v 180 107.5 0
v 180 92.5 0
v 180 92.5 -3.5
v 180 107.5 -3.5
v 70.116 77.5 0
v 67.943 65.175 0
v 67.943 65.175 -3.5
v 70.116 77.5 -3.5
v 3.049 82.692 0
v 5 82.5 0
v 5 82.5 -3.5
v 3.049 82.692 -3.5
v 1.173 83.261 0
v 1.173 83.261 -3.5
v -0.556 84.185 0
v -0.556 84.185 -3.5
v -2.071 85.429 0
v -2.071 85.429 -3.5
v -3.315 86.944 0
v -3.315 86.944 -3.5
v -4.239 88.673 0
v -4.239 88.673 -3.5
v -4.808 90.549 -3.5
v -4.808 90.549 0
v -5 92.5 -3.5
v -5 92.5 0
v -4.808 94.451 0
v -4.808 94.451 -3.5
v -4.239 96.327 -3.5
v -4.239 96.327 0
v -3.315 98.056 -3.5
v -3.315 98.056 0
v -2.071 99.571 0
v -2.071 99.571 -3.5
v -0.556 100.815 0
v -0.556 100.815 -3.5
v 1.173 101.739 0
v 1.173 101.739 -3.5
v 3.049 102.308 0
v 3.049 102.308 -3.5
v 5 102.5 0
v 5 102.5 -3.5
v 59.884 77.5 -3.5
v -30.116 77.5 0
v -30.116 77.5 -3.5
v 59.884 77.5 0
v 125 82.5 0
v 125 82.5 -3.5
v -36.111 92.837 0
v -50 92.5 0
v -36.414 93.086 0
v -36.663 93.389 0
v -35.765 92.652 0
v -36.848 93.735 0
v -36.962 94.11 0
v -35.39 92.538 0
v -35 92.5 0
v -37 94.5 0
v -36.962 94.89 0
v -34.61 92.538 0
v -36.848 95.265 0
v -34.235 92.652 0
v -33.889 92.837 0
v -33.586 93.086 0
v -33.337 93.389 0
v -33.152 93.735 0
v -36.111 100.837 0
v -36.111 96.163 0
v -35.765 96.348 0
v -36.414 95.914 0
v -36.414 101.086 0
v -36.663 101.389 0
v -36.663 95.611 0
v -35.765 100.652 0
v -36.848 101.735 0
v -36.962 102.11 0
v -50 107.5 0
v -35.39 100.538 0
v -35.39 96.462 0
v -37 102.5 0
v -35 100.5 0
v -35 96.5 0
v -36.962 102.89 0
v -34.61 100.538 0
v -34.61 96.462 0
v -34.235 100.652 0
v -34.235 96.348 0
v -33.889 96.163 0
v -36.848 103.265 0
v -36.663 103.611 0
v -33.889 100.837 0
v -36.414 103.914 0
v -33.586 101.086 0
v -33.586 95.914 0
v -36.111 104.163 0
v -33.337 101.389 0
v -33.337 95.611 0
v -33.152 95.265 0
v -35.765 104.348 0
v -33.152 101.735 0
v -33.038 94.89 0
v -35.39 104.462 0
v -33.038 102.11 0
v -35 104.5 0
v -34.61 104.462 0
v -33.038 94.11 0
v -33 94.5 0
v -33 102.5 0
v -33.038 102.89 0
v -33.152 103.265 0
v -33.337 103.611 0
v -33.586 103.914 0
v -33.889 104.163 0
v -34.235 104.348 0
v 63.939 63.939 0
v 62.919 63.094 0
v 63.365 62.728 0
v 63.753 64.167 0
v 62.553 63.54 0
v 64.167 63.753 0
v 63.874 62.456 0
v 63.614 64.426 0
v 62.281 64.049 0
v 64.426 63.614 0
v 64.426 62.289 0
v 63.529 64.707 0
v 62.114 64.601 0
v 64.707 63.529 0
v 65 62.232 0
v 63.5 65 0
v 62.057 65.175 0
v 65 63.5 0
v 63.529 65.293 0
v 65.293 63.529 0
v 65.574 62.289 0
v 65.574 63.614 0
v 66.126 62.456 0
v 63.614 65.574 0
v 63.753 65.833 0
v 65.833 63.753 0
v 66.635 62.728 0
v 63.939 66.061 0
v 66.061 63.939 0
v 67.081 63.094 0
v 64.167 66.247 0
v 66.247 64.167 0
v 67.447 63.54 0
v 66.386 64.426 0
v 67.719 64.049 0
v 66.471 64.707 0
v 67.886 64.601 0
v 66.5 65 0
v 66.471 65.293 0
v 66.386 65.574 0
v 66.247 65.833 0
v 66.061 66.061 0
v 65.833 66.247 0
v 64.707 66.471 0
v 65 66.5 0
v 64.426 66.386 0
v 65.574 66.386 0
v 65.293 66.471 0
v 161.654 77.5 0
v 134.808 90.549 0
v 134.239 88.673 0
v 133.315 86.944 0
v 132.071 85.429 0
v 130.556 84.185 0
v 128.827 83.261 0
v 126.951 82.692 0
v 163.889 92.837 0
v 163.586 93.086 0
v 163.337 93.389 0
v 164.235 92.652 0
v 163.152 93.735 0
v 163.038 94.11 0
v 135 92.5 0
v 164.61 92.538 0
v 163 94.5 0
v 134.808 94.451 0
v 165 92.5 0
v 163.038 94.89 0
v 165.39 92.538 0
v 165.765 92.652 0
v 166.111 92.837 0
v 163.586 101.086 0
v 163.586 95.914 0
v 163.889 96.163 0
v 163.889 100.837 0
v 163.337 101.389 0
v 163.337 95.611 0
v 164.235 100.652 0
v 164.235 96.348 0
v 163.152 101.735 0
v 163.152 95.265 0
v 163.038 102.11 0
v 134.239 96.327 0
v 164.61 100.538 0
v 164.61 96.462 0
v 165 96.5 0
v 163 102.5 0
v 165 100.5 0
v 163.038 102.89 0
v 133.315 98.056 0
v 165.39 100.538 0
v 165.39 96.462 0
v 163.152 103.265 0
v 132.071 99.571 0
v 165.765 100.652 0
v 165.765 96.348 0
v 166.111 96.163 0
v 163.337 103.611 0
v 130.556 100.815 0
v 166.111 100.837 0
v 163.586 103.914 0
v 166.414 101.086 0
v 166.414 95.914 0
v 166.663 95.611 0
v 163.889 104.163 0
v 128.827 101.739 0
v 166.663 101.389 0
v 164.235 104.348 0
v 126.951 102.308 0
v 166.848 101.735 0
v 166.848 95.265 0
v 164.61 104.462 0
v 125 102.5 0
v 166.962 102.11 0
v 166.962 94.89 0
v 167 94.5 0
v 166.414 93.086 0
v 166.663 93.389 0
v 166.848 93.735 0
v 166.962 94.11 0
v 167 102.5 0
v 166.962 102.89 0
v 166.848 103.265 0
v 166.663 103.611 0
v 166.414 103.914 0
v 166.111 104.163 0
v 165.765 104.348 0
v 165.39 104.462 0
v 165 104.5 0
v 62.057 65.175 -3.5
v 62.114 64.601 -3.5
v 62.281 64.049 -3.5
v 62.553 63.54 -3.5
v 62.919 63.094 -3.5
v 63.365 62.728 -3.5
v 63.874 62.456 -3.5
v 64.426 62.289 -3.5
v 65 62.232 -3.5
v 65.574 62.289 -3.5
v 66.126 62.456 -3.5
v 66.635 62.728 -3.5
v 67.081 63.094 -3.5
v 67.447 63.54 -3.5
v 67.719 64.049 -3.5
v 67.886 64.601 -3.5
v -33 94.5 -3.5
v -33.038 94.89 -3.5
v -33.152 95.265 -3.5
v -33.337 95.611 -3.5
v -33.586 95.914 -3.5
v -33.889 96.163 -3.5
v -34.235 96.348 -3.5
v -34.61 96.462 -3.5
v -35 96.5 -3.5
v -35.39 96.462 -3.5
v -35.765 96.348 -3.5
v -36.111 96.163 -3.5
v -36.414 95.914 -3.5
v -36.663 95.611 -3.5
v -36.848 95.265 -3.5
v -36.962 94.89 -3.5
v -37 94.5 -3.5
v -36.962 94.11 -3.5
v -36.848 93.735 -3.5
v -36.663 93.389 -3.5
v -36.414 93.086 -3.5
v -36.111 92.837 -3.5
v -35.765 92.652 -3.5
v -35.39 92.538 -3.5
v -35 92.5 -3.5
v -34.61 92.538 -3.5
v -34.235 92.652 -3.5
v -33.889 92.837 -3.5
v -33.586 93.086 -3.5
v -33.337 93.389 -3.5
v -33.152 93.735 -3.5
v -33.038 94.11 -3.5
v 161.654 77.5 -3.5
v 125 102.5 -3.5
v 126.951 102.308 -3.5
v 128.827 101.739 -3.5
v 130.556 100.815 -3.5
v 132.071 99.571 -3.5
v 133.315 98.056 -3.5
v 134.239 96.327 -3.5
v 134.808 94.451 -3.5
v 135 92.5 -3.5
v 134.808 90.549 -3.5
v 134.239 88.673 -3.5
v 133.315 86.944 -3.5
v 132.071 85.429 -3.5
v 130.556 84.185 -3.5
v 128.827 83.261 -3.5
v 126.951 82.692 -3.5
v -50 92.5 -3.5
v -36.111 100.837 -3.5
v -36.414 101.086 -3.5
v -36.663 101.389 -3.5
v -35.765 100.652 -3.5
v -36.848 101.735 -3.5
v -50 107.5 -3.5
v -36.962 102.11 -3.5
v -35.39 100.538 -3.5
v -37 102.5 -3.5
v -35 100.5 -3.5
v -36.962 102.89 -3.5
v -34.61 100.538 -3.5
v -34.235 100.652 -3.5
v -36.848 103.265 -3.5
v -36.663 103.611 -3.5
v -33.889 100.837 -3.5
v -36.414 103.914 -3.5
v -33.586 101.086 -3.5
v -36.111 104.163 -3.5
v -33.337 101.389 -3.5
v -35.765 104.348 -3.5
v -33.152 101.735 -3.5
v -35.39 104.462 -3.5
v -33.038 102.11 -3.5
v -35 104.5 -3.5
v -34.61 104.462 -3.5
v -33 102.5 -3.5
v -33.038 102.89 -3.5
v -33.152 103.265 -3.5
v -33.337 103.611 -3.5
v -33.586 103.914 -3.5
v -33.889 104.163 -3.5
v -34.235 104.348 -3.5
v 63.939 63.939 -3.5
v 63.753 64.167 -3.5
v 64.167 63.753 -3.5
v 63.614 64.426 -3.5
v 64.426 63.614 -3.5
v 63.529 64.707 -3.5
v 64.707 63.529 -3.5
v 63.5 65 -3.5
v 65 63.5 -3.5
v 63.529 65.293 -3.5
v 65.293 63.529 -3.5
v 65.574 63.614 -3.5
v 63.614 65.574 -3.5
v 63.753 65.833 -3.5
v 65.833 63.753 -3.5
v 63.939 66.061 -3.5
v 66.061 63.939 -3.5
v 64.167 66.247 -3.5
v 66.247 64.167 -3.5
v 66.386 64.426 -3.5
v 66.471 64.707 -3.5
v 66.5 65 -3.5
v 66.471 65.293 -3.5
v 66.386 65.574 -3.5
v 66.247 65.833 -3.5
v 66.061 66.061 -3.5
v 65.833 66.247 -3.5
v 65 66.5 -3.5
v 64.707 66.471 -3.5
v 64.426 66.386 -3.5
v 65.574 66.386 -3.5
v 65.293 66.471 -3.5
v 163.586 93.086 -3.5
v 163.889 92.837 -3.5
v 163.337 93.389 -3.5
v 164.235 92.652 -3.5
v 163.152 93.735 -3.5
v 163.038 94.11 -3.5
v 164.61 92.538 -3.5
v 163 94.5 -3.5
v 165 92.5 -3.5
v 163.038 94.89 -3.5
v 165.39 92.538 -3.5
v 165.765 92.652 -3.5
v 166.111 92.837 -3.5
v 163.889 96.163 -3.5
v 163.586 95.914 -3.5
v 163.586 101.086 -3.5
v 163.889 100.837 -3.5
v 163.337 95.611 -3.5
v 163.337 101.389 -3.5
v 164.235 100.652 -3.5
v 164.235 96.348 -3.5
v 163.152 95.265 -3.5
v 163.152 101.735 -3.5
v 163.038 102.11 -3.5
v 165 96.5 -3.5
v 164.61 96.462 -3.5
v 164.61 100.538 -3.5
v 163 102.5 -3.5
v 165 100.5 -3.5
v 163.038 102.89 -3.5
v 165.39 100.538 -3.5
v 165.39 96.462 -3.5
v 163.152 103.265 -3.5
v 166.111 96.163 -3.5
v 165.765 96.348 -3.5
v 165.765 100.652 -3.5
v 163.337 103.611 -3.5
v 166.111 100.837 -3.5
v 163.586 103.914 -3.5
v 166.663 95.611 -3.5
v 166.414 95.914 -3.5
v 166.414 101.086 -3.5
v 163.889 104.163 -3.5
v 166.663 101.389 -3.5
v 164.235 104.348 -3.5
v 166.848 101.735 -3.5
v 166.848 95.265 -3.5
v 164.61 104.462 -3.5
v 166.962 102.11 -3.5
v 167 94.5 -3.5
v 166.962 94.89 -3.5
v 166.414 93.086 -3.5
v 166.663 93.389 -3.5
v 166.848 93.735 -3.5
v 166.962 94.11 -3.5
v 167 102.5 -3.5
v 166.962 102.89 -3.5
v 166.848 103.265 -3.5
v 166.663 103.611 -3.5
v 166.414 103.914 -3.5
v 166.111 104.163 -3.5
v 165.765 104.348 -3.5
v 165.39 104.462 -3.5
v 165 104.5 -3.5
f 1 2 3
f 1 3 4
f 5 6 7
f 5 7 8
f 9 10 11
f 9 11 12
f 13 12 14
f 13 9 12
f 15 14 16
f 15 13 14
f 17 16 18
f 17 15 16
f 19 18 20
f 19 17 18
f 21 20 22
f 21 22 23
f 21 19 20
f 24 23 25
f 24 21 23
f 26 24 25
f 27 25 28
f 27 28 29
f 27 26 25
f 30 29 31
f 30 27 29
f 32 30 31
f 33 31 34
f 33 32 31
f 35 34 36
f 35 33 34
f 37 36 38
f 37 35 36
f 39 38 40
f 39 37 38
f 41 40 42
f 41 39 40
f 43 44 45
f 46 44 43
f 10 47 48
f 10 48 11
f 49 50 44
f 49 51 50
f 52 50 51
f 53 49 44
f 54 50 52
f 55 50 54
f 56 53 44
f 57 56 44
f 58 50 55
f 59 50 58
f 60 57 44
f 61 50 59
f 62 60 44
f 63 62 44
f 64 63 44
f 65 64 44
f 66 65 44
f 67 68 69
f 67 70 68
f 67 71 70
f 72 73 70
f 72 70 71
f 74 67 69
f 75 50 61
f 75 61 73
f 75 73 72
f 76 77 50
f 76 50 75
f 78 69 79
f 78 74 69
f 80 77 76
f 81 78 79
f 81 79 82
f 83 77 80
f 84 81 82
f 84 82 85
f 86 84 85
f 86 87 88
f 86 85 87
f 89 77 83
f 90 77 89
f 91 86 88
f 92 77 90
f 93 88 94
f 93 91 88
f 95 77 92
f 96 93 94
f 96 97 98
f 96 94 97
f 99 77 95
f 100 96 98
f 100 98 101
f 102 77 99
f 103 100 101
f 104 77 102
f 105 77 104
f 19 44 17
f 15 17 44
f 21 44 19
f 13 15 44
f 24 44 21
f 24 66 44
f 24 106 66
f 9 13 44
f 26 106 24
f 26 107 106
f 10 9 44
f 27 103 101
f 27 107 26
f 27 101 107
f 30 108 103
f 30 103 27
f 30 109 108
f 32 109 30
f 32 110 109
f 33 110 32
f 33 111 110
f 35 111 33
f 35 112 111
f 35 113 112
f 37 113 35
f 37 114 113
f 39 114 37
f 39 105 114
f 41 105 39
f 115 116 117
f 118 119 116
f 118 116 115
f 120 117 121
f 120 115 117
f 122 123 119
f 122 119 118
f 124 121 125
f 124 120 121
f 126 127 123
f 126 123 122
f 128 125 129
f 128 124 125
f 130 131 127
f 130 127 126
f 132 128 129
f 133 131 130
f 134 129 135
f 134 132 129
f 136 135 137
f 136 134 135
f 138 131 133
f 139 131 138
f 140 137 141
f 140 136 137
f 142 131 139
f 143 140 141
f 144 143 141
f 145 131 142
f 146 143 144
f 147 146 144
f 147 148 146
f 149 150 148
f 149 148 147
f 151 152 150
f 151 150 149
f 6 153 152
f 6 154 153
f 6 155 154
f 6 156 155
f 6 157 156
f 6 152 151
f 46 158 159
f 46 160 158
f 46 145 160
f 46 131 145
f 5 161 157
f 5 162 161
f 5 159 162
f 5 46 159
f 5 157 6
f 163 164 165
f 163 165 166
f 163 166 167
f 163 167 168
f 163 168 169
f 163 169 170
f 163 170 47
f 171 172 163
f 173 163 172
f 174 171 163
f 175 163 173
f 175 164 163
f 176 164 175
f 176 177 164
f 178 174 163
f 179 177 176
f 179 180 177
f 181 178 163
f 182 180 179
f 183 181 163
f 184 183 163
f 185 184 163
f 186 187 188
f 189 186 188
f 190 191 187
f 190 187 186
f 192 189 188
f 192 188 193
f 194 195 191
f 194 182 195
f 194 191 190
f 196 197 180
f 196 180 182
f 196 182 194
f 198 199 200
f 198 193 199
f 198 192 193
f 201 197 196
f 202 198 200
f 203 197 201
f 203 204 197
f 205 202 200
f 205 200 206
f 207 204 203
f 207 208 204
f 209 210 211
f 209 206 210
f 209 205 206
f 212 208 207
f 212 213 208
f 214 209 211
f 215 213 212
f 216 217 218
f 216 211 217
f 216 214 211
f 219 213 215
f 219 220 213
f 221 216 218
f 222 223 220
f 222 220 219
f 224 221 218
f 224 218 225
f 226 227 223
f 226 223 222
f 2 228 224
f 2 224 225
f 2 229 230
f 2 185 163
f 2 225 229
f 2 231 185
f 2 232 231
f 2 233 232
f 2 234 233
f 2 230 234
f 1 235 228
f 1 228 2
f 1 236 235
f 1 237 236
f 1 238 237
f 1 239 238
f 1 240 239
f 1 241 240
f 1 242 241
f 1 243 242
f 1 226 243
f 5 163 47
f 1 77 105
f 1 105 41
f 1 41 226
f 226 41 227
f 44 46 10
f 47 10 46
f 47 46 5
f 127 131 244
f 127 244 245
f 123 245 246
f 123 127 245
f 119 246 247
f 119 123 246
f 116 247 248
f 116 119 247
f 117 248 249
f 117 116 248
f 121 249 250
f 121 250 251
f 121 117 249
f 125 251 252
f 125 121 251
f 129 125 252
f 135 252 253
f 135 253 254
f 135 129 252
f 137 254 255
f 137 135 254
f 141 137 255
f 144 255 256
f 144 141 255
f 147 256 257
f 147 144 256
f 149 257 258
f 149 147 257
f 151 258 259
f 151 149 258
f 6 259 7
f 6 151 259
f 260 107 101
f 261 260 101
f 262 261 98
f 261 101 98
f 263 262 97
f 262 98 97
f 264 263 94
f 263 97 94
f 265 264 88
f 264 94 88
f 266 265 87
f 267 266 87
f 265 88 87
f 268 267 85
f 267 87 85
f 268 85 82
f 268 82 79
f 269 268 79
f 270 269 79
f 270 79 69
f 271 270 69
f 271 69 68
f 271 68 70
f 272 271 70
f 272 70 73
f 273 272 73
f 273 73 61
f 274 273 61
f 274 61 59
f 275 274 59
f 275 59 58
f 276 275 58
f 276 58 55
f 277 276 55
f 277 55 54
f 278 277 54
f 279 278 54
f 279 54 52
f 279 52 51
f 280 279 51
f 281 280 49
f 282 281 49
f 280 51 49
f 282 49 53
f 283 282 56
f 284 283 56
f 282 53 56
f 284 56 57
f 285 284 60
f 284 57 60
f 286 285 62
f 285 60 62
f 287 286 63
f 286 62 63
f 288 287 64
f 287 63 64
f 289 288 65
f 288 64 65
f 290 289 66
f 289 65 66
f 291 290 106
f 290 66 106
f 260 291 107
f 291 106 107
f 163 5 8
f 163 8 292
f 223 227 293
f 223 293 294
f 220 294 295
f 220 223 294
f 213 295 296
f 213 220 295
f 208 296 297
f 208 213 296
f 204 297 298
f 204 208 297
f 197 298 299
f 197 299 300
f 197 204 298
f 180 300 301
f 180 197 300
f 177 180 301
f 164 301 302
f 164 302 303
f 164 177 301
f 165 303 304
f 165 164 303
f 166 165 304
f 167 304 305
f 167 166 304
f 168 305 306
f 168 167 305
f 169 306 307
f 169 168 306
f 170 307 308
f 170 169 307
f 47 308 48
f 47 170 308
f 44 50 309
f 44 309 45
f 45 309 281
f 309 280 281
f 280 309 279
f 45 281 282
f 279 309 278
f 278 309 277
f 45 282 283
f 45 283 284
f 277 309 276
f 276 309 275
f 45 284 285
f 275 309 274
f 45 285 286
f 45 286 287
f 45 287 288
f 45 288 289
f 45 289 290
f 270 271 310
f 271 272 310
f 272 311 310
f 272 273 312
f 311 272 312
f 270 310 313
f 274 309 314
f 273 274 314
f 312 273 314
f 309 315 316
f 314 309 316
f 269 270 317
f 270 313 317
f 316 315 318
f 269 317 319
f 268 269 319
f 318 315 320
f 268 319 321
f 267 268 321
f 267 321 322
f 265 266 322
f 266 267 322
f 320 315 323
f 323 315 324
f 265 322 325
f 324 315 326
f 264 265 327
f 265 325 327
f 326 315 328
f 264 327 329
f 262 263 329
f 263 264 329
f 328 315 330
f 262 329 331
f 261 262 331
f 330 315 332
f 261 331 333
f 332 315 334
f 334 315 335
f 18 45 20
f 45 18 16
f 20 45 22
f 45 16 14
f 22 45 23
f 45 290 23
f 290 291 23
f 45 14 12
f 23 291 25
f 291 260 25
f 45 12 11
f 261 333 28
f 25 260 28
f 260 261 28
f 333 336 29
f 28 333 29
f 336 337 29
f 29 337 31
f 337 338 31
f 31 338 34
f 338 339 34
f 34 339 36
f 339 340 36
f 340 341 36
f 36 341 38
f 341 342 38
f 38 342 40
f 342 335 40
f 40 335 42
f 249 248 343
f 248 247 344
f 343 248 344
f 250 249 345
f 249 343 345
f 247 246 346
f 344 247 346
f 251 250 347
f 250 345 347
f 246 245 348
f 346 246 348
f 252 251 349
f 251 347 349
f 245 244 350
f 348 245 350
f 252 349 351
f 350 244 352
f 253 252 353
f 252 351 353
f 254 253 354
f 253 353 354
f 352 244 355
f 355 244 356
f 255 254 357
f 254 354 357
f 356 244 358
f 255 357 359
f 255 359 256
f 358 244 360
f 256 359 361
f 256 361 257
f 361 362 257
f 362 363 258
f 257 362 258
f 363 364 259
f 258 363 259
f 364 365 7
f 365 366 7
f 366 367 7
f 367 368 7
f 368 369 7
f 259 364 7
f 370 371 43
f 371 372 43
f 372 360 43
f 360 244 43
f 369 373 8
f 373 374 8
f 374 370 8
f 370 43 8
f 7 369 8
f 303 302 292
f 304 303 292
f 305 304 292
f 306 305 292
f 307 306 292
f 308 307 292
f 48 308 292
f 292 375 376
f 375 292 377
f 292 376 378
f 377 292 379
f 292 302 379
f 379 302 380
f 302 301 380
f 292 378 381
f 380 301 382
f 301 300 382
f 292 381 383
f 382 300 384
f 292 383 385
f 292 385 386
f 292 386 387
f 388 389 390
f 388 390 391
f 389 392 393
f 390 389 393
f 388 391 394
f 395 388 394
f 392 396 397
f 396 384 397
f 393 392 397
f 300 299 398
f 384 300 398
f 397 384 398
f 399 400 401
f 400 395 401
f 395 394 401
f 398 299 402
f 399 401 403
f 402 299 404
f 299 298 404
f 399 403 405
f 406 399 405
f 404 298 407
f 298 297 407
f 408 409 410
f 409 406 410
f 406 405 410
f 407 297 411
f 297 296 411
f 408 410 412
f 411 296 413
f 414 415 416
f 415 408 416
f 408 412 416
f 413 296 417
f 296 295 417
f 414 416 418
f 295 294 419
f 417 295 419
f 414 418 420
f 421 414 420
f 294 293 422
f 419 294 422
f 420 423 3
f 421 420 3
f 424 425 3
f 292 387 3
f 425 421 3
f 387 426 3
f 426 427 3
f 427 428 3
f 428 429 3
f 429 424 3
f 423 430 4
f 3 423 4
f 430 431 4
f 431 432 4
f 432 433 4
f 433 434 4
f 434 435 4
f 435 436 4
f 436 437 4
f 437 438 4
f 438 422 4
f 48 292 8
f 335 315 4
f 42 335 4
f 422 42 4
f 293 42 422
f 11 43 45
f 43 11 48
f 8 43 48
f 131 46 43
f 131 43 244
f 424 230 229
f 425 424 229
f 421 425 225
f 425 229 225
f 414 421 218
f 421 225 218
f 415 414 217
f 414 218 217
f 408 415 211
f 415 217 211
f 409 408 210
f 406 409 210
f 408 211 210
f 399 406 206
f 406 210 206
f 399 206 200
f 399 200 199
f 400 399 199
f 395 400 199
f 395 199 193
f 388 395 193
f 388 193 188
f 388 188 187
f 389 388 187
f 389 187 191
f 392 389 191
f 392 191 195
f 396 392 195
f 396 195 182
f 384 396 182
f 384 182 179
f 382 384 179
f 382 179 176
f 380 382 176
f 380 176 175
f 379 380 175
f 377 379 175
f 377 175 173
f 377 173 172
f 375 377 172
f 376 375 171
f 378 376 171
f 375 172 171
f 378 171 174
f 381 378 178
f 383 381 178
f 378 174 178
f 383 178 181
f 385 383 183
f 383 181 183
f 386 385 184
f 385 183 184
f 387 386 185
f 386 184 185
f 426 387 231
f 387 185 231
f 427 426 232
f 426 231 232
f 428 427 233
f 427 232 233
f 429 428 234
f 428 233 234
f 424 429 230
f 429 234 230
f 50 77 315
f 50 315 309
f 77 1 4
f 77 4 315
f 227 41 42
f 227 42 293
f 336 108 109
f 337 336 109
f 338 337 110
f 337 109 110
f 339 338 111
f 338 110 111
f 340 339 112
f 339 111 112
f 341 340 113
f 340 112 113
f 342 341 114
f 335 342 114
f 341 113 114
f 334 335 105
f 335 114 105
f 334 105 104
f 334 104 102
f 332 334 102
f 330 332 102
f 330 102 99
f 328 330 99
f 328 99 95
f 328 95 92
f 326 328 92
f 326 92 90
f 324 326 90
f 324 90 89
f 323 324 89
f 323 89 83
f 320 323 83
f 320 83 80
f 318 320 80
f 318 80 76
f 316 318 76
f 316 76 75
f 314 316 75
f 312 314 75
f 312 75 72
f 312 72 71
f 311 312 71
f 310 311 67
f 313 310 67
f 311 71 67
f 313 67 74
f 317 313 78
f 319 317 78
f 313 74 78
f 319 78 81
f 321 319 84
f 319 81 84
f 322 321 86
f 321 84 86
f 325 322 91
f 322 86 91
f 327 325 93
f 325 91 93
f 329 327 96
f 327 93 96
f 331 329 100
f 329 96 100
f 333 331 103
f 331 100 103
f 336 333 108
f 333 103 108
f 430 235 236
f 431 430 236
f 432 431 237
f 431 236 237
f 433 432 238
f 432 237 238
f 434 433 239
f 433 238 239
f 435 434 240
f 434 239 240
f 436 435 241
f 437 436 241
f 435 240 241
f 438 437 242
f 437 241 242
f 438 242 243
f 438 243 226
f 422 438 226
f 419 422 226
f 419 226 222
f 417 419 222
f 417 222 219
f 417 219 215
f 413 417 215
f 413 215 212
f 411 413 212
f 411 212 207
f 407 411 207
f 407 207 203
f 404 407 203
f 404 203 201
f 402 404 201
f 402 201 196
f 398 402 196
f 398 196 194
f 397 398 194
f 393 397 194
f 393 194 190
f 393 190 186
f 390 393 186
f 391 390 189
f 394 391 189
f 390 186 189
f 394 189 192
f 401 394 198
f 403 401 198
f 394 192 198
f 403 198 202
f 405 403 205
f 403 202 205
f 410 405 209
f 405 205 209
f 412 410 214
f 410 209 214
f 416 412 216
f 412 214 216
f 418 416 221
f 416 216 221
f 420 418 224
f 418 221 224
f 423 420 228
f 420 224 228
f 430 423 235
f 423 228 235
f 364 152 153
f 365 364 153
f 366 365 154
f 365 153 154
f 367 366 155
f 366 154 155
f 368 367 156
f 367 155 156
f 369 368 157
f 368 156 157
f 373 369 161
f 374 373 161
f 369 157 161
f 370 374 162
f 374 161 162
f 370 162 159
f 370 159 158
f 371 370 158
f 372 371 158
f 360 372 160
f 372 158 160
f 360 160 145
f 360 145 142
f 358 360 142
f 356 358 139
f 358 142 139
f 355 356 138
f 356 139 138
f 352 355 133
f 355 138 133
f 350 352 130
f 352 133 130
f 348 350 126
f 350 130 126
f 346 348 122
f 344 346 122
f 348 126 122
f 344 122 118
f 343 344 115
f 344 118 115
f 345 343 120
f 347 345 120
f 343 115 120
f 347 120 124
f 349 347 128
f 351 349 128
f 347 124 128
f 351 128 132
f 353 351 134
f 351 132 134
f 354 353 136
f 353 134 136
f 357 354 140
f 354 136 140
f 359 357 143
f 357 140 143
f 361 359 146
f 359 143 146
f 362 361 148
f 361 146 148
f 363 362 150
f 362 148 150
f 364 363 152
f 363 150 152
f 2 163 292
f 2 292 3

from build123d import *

# Parameters (mm, degrees)
SKETCH4_R           = 1.5
BOSS_EXTRUDE1_DEPTH = 3.5
SKETCH6_R           = 2
CUT_EXTRUDE1_DEPTH  = 10


with BuildPart() as part:
    # Sketch4 → Boss-Extrude1 (new body)
    with BuildSketch(Plane.XY):
        with BuildLine():
            Line((59.884076231, 77.5), (62.057311876, 65.174968198))
            ThreePointArc((62.057311876, 65.174968198), (65, 62.232280074), (67.942688124, 65.174968198))
            Line((67.942688124, 65.174968198), (70.115923769, 77.5))
            Line((70.115923769, 77.5), (161.654067638, 77.5))
            Line((161.654067638, 77.5), (180, 92.5))
            Line((180, 92.5), (180, 107.5))
            Line((180, 107.5), (-50, 107.5))
            Line((-50, 107.5), (-50, 92.5))
            Line((-50, 92.5), (-30.115923769, 77.5))
            Line((-30.115923769, 77.5), (59.884076231, 77.5))
        make_face()
        with Locations((65, 65)):
            Circle(SKETCH4_R, mode=Mode.SUBTRACT)
        with BuildLine():
            Line((125, 82.5), (5, 82.5))
            ThreePointArc((5, 82.5), (-5, 92.5), (5, 102.5))
            Line((5, 102.5), (125, 102.5))
            ThreePointArc((125, 102.5), (135, 92.5), (125, 82.5))
        make_face(mode=Mode.SUBTRACT)
    extrude(amount=-BOSS_EXTRUDE1_DEPTH)

    # Sketch6 → Cut-Extrude1 (cut)
    with BuildSketch(Plane.XY):
        with Locations((-35, 102.5)):
            Circle(SKETCH6_R)
        with Locations((-35, 94.5)):
            Circle(SKETCH6_R)
        with Locations((165, 94.5)):
            Circle(SKETCH6_R)
        with Locations((165, 102.5)):
            Circle(SKETCH6_R)
    extrude(amount=-CUT_EXTRUDE1_DEPTH, mode=Mode.SUBTRACT)


solid = part.part
